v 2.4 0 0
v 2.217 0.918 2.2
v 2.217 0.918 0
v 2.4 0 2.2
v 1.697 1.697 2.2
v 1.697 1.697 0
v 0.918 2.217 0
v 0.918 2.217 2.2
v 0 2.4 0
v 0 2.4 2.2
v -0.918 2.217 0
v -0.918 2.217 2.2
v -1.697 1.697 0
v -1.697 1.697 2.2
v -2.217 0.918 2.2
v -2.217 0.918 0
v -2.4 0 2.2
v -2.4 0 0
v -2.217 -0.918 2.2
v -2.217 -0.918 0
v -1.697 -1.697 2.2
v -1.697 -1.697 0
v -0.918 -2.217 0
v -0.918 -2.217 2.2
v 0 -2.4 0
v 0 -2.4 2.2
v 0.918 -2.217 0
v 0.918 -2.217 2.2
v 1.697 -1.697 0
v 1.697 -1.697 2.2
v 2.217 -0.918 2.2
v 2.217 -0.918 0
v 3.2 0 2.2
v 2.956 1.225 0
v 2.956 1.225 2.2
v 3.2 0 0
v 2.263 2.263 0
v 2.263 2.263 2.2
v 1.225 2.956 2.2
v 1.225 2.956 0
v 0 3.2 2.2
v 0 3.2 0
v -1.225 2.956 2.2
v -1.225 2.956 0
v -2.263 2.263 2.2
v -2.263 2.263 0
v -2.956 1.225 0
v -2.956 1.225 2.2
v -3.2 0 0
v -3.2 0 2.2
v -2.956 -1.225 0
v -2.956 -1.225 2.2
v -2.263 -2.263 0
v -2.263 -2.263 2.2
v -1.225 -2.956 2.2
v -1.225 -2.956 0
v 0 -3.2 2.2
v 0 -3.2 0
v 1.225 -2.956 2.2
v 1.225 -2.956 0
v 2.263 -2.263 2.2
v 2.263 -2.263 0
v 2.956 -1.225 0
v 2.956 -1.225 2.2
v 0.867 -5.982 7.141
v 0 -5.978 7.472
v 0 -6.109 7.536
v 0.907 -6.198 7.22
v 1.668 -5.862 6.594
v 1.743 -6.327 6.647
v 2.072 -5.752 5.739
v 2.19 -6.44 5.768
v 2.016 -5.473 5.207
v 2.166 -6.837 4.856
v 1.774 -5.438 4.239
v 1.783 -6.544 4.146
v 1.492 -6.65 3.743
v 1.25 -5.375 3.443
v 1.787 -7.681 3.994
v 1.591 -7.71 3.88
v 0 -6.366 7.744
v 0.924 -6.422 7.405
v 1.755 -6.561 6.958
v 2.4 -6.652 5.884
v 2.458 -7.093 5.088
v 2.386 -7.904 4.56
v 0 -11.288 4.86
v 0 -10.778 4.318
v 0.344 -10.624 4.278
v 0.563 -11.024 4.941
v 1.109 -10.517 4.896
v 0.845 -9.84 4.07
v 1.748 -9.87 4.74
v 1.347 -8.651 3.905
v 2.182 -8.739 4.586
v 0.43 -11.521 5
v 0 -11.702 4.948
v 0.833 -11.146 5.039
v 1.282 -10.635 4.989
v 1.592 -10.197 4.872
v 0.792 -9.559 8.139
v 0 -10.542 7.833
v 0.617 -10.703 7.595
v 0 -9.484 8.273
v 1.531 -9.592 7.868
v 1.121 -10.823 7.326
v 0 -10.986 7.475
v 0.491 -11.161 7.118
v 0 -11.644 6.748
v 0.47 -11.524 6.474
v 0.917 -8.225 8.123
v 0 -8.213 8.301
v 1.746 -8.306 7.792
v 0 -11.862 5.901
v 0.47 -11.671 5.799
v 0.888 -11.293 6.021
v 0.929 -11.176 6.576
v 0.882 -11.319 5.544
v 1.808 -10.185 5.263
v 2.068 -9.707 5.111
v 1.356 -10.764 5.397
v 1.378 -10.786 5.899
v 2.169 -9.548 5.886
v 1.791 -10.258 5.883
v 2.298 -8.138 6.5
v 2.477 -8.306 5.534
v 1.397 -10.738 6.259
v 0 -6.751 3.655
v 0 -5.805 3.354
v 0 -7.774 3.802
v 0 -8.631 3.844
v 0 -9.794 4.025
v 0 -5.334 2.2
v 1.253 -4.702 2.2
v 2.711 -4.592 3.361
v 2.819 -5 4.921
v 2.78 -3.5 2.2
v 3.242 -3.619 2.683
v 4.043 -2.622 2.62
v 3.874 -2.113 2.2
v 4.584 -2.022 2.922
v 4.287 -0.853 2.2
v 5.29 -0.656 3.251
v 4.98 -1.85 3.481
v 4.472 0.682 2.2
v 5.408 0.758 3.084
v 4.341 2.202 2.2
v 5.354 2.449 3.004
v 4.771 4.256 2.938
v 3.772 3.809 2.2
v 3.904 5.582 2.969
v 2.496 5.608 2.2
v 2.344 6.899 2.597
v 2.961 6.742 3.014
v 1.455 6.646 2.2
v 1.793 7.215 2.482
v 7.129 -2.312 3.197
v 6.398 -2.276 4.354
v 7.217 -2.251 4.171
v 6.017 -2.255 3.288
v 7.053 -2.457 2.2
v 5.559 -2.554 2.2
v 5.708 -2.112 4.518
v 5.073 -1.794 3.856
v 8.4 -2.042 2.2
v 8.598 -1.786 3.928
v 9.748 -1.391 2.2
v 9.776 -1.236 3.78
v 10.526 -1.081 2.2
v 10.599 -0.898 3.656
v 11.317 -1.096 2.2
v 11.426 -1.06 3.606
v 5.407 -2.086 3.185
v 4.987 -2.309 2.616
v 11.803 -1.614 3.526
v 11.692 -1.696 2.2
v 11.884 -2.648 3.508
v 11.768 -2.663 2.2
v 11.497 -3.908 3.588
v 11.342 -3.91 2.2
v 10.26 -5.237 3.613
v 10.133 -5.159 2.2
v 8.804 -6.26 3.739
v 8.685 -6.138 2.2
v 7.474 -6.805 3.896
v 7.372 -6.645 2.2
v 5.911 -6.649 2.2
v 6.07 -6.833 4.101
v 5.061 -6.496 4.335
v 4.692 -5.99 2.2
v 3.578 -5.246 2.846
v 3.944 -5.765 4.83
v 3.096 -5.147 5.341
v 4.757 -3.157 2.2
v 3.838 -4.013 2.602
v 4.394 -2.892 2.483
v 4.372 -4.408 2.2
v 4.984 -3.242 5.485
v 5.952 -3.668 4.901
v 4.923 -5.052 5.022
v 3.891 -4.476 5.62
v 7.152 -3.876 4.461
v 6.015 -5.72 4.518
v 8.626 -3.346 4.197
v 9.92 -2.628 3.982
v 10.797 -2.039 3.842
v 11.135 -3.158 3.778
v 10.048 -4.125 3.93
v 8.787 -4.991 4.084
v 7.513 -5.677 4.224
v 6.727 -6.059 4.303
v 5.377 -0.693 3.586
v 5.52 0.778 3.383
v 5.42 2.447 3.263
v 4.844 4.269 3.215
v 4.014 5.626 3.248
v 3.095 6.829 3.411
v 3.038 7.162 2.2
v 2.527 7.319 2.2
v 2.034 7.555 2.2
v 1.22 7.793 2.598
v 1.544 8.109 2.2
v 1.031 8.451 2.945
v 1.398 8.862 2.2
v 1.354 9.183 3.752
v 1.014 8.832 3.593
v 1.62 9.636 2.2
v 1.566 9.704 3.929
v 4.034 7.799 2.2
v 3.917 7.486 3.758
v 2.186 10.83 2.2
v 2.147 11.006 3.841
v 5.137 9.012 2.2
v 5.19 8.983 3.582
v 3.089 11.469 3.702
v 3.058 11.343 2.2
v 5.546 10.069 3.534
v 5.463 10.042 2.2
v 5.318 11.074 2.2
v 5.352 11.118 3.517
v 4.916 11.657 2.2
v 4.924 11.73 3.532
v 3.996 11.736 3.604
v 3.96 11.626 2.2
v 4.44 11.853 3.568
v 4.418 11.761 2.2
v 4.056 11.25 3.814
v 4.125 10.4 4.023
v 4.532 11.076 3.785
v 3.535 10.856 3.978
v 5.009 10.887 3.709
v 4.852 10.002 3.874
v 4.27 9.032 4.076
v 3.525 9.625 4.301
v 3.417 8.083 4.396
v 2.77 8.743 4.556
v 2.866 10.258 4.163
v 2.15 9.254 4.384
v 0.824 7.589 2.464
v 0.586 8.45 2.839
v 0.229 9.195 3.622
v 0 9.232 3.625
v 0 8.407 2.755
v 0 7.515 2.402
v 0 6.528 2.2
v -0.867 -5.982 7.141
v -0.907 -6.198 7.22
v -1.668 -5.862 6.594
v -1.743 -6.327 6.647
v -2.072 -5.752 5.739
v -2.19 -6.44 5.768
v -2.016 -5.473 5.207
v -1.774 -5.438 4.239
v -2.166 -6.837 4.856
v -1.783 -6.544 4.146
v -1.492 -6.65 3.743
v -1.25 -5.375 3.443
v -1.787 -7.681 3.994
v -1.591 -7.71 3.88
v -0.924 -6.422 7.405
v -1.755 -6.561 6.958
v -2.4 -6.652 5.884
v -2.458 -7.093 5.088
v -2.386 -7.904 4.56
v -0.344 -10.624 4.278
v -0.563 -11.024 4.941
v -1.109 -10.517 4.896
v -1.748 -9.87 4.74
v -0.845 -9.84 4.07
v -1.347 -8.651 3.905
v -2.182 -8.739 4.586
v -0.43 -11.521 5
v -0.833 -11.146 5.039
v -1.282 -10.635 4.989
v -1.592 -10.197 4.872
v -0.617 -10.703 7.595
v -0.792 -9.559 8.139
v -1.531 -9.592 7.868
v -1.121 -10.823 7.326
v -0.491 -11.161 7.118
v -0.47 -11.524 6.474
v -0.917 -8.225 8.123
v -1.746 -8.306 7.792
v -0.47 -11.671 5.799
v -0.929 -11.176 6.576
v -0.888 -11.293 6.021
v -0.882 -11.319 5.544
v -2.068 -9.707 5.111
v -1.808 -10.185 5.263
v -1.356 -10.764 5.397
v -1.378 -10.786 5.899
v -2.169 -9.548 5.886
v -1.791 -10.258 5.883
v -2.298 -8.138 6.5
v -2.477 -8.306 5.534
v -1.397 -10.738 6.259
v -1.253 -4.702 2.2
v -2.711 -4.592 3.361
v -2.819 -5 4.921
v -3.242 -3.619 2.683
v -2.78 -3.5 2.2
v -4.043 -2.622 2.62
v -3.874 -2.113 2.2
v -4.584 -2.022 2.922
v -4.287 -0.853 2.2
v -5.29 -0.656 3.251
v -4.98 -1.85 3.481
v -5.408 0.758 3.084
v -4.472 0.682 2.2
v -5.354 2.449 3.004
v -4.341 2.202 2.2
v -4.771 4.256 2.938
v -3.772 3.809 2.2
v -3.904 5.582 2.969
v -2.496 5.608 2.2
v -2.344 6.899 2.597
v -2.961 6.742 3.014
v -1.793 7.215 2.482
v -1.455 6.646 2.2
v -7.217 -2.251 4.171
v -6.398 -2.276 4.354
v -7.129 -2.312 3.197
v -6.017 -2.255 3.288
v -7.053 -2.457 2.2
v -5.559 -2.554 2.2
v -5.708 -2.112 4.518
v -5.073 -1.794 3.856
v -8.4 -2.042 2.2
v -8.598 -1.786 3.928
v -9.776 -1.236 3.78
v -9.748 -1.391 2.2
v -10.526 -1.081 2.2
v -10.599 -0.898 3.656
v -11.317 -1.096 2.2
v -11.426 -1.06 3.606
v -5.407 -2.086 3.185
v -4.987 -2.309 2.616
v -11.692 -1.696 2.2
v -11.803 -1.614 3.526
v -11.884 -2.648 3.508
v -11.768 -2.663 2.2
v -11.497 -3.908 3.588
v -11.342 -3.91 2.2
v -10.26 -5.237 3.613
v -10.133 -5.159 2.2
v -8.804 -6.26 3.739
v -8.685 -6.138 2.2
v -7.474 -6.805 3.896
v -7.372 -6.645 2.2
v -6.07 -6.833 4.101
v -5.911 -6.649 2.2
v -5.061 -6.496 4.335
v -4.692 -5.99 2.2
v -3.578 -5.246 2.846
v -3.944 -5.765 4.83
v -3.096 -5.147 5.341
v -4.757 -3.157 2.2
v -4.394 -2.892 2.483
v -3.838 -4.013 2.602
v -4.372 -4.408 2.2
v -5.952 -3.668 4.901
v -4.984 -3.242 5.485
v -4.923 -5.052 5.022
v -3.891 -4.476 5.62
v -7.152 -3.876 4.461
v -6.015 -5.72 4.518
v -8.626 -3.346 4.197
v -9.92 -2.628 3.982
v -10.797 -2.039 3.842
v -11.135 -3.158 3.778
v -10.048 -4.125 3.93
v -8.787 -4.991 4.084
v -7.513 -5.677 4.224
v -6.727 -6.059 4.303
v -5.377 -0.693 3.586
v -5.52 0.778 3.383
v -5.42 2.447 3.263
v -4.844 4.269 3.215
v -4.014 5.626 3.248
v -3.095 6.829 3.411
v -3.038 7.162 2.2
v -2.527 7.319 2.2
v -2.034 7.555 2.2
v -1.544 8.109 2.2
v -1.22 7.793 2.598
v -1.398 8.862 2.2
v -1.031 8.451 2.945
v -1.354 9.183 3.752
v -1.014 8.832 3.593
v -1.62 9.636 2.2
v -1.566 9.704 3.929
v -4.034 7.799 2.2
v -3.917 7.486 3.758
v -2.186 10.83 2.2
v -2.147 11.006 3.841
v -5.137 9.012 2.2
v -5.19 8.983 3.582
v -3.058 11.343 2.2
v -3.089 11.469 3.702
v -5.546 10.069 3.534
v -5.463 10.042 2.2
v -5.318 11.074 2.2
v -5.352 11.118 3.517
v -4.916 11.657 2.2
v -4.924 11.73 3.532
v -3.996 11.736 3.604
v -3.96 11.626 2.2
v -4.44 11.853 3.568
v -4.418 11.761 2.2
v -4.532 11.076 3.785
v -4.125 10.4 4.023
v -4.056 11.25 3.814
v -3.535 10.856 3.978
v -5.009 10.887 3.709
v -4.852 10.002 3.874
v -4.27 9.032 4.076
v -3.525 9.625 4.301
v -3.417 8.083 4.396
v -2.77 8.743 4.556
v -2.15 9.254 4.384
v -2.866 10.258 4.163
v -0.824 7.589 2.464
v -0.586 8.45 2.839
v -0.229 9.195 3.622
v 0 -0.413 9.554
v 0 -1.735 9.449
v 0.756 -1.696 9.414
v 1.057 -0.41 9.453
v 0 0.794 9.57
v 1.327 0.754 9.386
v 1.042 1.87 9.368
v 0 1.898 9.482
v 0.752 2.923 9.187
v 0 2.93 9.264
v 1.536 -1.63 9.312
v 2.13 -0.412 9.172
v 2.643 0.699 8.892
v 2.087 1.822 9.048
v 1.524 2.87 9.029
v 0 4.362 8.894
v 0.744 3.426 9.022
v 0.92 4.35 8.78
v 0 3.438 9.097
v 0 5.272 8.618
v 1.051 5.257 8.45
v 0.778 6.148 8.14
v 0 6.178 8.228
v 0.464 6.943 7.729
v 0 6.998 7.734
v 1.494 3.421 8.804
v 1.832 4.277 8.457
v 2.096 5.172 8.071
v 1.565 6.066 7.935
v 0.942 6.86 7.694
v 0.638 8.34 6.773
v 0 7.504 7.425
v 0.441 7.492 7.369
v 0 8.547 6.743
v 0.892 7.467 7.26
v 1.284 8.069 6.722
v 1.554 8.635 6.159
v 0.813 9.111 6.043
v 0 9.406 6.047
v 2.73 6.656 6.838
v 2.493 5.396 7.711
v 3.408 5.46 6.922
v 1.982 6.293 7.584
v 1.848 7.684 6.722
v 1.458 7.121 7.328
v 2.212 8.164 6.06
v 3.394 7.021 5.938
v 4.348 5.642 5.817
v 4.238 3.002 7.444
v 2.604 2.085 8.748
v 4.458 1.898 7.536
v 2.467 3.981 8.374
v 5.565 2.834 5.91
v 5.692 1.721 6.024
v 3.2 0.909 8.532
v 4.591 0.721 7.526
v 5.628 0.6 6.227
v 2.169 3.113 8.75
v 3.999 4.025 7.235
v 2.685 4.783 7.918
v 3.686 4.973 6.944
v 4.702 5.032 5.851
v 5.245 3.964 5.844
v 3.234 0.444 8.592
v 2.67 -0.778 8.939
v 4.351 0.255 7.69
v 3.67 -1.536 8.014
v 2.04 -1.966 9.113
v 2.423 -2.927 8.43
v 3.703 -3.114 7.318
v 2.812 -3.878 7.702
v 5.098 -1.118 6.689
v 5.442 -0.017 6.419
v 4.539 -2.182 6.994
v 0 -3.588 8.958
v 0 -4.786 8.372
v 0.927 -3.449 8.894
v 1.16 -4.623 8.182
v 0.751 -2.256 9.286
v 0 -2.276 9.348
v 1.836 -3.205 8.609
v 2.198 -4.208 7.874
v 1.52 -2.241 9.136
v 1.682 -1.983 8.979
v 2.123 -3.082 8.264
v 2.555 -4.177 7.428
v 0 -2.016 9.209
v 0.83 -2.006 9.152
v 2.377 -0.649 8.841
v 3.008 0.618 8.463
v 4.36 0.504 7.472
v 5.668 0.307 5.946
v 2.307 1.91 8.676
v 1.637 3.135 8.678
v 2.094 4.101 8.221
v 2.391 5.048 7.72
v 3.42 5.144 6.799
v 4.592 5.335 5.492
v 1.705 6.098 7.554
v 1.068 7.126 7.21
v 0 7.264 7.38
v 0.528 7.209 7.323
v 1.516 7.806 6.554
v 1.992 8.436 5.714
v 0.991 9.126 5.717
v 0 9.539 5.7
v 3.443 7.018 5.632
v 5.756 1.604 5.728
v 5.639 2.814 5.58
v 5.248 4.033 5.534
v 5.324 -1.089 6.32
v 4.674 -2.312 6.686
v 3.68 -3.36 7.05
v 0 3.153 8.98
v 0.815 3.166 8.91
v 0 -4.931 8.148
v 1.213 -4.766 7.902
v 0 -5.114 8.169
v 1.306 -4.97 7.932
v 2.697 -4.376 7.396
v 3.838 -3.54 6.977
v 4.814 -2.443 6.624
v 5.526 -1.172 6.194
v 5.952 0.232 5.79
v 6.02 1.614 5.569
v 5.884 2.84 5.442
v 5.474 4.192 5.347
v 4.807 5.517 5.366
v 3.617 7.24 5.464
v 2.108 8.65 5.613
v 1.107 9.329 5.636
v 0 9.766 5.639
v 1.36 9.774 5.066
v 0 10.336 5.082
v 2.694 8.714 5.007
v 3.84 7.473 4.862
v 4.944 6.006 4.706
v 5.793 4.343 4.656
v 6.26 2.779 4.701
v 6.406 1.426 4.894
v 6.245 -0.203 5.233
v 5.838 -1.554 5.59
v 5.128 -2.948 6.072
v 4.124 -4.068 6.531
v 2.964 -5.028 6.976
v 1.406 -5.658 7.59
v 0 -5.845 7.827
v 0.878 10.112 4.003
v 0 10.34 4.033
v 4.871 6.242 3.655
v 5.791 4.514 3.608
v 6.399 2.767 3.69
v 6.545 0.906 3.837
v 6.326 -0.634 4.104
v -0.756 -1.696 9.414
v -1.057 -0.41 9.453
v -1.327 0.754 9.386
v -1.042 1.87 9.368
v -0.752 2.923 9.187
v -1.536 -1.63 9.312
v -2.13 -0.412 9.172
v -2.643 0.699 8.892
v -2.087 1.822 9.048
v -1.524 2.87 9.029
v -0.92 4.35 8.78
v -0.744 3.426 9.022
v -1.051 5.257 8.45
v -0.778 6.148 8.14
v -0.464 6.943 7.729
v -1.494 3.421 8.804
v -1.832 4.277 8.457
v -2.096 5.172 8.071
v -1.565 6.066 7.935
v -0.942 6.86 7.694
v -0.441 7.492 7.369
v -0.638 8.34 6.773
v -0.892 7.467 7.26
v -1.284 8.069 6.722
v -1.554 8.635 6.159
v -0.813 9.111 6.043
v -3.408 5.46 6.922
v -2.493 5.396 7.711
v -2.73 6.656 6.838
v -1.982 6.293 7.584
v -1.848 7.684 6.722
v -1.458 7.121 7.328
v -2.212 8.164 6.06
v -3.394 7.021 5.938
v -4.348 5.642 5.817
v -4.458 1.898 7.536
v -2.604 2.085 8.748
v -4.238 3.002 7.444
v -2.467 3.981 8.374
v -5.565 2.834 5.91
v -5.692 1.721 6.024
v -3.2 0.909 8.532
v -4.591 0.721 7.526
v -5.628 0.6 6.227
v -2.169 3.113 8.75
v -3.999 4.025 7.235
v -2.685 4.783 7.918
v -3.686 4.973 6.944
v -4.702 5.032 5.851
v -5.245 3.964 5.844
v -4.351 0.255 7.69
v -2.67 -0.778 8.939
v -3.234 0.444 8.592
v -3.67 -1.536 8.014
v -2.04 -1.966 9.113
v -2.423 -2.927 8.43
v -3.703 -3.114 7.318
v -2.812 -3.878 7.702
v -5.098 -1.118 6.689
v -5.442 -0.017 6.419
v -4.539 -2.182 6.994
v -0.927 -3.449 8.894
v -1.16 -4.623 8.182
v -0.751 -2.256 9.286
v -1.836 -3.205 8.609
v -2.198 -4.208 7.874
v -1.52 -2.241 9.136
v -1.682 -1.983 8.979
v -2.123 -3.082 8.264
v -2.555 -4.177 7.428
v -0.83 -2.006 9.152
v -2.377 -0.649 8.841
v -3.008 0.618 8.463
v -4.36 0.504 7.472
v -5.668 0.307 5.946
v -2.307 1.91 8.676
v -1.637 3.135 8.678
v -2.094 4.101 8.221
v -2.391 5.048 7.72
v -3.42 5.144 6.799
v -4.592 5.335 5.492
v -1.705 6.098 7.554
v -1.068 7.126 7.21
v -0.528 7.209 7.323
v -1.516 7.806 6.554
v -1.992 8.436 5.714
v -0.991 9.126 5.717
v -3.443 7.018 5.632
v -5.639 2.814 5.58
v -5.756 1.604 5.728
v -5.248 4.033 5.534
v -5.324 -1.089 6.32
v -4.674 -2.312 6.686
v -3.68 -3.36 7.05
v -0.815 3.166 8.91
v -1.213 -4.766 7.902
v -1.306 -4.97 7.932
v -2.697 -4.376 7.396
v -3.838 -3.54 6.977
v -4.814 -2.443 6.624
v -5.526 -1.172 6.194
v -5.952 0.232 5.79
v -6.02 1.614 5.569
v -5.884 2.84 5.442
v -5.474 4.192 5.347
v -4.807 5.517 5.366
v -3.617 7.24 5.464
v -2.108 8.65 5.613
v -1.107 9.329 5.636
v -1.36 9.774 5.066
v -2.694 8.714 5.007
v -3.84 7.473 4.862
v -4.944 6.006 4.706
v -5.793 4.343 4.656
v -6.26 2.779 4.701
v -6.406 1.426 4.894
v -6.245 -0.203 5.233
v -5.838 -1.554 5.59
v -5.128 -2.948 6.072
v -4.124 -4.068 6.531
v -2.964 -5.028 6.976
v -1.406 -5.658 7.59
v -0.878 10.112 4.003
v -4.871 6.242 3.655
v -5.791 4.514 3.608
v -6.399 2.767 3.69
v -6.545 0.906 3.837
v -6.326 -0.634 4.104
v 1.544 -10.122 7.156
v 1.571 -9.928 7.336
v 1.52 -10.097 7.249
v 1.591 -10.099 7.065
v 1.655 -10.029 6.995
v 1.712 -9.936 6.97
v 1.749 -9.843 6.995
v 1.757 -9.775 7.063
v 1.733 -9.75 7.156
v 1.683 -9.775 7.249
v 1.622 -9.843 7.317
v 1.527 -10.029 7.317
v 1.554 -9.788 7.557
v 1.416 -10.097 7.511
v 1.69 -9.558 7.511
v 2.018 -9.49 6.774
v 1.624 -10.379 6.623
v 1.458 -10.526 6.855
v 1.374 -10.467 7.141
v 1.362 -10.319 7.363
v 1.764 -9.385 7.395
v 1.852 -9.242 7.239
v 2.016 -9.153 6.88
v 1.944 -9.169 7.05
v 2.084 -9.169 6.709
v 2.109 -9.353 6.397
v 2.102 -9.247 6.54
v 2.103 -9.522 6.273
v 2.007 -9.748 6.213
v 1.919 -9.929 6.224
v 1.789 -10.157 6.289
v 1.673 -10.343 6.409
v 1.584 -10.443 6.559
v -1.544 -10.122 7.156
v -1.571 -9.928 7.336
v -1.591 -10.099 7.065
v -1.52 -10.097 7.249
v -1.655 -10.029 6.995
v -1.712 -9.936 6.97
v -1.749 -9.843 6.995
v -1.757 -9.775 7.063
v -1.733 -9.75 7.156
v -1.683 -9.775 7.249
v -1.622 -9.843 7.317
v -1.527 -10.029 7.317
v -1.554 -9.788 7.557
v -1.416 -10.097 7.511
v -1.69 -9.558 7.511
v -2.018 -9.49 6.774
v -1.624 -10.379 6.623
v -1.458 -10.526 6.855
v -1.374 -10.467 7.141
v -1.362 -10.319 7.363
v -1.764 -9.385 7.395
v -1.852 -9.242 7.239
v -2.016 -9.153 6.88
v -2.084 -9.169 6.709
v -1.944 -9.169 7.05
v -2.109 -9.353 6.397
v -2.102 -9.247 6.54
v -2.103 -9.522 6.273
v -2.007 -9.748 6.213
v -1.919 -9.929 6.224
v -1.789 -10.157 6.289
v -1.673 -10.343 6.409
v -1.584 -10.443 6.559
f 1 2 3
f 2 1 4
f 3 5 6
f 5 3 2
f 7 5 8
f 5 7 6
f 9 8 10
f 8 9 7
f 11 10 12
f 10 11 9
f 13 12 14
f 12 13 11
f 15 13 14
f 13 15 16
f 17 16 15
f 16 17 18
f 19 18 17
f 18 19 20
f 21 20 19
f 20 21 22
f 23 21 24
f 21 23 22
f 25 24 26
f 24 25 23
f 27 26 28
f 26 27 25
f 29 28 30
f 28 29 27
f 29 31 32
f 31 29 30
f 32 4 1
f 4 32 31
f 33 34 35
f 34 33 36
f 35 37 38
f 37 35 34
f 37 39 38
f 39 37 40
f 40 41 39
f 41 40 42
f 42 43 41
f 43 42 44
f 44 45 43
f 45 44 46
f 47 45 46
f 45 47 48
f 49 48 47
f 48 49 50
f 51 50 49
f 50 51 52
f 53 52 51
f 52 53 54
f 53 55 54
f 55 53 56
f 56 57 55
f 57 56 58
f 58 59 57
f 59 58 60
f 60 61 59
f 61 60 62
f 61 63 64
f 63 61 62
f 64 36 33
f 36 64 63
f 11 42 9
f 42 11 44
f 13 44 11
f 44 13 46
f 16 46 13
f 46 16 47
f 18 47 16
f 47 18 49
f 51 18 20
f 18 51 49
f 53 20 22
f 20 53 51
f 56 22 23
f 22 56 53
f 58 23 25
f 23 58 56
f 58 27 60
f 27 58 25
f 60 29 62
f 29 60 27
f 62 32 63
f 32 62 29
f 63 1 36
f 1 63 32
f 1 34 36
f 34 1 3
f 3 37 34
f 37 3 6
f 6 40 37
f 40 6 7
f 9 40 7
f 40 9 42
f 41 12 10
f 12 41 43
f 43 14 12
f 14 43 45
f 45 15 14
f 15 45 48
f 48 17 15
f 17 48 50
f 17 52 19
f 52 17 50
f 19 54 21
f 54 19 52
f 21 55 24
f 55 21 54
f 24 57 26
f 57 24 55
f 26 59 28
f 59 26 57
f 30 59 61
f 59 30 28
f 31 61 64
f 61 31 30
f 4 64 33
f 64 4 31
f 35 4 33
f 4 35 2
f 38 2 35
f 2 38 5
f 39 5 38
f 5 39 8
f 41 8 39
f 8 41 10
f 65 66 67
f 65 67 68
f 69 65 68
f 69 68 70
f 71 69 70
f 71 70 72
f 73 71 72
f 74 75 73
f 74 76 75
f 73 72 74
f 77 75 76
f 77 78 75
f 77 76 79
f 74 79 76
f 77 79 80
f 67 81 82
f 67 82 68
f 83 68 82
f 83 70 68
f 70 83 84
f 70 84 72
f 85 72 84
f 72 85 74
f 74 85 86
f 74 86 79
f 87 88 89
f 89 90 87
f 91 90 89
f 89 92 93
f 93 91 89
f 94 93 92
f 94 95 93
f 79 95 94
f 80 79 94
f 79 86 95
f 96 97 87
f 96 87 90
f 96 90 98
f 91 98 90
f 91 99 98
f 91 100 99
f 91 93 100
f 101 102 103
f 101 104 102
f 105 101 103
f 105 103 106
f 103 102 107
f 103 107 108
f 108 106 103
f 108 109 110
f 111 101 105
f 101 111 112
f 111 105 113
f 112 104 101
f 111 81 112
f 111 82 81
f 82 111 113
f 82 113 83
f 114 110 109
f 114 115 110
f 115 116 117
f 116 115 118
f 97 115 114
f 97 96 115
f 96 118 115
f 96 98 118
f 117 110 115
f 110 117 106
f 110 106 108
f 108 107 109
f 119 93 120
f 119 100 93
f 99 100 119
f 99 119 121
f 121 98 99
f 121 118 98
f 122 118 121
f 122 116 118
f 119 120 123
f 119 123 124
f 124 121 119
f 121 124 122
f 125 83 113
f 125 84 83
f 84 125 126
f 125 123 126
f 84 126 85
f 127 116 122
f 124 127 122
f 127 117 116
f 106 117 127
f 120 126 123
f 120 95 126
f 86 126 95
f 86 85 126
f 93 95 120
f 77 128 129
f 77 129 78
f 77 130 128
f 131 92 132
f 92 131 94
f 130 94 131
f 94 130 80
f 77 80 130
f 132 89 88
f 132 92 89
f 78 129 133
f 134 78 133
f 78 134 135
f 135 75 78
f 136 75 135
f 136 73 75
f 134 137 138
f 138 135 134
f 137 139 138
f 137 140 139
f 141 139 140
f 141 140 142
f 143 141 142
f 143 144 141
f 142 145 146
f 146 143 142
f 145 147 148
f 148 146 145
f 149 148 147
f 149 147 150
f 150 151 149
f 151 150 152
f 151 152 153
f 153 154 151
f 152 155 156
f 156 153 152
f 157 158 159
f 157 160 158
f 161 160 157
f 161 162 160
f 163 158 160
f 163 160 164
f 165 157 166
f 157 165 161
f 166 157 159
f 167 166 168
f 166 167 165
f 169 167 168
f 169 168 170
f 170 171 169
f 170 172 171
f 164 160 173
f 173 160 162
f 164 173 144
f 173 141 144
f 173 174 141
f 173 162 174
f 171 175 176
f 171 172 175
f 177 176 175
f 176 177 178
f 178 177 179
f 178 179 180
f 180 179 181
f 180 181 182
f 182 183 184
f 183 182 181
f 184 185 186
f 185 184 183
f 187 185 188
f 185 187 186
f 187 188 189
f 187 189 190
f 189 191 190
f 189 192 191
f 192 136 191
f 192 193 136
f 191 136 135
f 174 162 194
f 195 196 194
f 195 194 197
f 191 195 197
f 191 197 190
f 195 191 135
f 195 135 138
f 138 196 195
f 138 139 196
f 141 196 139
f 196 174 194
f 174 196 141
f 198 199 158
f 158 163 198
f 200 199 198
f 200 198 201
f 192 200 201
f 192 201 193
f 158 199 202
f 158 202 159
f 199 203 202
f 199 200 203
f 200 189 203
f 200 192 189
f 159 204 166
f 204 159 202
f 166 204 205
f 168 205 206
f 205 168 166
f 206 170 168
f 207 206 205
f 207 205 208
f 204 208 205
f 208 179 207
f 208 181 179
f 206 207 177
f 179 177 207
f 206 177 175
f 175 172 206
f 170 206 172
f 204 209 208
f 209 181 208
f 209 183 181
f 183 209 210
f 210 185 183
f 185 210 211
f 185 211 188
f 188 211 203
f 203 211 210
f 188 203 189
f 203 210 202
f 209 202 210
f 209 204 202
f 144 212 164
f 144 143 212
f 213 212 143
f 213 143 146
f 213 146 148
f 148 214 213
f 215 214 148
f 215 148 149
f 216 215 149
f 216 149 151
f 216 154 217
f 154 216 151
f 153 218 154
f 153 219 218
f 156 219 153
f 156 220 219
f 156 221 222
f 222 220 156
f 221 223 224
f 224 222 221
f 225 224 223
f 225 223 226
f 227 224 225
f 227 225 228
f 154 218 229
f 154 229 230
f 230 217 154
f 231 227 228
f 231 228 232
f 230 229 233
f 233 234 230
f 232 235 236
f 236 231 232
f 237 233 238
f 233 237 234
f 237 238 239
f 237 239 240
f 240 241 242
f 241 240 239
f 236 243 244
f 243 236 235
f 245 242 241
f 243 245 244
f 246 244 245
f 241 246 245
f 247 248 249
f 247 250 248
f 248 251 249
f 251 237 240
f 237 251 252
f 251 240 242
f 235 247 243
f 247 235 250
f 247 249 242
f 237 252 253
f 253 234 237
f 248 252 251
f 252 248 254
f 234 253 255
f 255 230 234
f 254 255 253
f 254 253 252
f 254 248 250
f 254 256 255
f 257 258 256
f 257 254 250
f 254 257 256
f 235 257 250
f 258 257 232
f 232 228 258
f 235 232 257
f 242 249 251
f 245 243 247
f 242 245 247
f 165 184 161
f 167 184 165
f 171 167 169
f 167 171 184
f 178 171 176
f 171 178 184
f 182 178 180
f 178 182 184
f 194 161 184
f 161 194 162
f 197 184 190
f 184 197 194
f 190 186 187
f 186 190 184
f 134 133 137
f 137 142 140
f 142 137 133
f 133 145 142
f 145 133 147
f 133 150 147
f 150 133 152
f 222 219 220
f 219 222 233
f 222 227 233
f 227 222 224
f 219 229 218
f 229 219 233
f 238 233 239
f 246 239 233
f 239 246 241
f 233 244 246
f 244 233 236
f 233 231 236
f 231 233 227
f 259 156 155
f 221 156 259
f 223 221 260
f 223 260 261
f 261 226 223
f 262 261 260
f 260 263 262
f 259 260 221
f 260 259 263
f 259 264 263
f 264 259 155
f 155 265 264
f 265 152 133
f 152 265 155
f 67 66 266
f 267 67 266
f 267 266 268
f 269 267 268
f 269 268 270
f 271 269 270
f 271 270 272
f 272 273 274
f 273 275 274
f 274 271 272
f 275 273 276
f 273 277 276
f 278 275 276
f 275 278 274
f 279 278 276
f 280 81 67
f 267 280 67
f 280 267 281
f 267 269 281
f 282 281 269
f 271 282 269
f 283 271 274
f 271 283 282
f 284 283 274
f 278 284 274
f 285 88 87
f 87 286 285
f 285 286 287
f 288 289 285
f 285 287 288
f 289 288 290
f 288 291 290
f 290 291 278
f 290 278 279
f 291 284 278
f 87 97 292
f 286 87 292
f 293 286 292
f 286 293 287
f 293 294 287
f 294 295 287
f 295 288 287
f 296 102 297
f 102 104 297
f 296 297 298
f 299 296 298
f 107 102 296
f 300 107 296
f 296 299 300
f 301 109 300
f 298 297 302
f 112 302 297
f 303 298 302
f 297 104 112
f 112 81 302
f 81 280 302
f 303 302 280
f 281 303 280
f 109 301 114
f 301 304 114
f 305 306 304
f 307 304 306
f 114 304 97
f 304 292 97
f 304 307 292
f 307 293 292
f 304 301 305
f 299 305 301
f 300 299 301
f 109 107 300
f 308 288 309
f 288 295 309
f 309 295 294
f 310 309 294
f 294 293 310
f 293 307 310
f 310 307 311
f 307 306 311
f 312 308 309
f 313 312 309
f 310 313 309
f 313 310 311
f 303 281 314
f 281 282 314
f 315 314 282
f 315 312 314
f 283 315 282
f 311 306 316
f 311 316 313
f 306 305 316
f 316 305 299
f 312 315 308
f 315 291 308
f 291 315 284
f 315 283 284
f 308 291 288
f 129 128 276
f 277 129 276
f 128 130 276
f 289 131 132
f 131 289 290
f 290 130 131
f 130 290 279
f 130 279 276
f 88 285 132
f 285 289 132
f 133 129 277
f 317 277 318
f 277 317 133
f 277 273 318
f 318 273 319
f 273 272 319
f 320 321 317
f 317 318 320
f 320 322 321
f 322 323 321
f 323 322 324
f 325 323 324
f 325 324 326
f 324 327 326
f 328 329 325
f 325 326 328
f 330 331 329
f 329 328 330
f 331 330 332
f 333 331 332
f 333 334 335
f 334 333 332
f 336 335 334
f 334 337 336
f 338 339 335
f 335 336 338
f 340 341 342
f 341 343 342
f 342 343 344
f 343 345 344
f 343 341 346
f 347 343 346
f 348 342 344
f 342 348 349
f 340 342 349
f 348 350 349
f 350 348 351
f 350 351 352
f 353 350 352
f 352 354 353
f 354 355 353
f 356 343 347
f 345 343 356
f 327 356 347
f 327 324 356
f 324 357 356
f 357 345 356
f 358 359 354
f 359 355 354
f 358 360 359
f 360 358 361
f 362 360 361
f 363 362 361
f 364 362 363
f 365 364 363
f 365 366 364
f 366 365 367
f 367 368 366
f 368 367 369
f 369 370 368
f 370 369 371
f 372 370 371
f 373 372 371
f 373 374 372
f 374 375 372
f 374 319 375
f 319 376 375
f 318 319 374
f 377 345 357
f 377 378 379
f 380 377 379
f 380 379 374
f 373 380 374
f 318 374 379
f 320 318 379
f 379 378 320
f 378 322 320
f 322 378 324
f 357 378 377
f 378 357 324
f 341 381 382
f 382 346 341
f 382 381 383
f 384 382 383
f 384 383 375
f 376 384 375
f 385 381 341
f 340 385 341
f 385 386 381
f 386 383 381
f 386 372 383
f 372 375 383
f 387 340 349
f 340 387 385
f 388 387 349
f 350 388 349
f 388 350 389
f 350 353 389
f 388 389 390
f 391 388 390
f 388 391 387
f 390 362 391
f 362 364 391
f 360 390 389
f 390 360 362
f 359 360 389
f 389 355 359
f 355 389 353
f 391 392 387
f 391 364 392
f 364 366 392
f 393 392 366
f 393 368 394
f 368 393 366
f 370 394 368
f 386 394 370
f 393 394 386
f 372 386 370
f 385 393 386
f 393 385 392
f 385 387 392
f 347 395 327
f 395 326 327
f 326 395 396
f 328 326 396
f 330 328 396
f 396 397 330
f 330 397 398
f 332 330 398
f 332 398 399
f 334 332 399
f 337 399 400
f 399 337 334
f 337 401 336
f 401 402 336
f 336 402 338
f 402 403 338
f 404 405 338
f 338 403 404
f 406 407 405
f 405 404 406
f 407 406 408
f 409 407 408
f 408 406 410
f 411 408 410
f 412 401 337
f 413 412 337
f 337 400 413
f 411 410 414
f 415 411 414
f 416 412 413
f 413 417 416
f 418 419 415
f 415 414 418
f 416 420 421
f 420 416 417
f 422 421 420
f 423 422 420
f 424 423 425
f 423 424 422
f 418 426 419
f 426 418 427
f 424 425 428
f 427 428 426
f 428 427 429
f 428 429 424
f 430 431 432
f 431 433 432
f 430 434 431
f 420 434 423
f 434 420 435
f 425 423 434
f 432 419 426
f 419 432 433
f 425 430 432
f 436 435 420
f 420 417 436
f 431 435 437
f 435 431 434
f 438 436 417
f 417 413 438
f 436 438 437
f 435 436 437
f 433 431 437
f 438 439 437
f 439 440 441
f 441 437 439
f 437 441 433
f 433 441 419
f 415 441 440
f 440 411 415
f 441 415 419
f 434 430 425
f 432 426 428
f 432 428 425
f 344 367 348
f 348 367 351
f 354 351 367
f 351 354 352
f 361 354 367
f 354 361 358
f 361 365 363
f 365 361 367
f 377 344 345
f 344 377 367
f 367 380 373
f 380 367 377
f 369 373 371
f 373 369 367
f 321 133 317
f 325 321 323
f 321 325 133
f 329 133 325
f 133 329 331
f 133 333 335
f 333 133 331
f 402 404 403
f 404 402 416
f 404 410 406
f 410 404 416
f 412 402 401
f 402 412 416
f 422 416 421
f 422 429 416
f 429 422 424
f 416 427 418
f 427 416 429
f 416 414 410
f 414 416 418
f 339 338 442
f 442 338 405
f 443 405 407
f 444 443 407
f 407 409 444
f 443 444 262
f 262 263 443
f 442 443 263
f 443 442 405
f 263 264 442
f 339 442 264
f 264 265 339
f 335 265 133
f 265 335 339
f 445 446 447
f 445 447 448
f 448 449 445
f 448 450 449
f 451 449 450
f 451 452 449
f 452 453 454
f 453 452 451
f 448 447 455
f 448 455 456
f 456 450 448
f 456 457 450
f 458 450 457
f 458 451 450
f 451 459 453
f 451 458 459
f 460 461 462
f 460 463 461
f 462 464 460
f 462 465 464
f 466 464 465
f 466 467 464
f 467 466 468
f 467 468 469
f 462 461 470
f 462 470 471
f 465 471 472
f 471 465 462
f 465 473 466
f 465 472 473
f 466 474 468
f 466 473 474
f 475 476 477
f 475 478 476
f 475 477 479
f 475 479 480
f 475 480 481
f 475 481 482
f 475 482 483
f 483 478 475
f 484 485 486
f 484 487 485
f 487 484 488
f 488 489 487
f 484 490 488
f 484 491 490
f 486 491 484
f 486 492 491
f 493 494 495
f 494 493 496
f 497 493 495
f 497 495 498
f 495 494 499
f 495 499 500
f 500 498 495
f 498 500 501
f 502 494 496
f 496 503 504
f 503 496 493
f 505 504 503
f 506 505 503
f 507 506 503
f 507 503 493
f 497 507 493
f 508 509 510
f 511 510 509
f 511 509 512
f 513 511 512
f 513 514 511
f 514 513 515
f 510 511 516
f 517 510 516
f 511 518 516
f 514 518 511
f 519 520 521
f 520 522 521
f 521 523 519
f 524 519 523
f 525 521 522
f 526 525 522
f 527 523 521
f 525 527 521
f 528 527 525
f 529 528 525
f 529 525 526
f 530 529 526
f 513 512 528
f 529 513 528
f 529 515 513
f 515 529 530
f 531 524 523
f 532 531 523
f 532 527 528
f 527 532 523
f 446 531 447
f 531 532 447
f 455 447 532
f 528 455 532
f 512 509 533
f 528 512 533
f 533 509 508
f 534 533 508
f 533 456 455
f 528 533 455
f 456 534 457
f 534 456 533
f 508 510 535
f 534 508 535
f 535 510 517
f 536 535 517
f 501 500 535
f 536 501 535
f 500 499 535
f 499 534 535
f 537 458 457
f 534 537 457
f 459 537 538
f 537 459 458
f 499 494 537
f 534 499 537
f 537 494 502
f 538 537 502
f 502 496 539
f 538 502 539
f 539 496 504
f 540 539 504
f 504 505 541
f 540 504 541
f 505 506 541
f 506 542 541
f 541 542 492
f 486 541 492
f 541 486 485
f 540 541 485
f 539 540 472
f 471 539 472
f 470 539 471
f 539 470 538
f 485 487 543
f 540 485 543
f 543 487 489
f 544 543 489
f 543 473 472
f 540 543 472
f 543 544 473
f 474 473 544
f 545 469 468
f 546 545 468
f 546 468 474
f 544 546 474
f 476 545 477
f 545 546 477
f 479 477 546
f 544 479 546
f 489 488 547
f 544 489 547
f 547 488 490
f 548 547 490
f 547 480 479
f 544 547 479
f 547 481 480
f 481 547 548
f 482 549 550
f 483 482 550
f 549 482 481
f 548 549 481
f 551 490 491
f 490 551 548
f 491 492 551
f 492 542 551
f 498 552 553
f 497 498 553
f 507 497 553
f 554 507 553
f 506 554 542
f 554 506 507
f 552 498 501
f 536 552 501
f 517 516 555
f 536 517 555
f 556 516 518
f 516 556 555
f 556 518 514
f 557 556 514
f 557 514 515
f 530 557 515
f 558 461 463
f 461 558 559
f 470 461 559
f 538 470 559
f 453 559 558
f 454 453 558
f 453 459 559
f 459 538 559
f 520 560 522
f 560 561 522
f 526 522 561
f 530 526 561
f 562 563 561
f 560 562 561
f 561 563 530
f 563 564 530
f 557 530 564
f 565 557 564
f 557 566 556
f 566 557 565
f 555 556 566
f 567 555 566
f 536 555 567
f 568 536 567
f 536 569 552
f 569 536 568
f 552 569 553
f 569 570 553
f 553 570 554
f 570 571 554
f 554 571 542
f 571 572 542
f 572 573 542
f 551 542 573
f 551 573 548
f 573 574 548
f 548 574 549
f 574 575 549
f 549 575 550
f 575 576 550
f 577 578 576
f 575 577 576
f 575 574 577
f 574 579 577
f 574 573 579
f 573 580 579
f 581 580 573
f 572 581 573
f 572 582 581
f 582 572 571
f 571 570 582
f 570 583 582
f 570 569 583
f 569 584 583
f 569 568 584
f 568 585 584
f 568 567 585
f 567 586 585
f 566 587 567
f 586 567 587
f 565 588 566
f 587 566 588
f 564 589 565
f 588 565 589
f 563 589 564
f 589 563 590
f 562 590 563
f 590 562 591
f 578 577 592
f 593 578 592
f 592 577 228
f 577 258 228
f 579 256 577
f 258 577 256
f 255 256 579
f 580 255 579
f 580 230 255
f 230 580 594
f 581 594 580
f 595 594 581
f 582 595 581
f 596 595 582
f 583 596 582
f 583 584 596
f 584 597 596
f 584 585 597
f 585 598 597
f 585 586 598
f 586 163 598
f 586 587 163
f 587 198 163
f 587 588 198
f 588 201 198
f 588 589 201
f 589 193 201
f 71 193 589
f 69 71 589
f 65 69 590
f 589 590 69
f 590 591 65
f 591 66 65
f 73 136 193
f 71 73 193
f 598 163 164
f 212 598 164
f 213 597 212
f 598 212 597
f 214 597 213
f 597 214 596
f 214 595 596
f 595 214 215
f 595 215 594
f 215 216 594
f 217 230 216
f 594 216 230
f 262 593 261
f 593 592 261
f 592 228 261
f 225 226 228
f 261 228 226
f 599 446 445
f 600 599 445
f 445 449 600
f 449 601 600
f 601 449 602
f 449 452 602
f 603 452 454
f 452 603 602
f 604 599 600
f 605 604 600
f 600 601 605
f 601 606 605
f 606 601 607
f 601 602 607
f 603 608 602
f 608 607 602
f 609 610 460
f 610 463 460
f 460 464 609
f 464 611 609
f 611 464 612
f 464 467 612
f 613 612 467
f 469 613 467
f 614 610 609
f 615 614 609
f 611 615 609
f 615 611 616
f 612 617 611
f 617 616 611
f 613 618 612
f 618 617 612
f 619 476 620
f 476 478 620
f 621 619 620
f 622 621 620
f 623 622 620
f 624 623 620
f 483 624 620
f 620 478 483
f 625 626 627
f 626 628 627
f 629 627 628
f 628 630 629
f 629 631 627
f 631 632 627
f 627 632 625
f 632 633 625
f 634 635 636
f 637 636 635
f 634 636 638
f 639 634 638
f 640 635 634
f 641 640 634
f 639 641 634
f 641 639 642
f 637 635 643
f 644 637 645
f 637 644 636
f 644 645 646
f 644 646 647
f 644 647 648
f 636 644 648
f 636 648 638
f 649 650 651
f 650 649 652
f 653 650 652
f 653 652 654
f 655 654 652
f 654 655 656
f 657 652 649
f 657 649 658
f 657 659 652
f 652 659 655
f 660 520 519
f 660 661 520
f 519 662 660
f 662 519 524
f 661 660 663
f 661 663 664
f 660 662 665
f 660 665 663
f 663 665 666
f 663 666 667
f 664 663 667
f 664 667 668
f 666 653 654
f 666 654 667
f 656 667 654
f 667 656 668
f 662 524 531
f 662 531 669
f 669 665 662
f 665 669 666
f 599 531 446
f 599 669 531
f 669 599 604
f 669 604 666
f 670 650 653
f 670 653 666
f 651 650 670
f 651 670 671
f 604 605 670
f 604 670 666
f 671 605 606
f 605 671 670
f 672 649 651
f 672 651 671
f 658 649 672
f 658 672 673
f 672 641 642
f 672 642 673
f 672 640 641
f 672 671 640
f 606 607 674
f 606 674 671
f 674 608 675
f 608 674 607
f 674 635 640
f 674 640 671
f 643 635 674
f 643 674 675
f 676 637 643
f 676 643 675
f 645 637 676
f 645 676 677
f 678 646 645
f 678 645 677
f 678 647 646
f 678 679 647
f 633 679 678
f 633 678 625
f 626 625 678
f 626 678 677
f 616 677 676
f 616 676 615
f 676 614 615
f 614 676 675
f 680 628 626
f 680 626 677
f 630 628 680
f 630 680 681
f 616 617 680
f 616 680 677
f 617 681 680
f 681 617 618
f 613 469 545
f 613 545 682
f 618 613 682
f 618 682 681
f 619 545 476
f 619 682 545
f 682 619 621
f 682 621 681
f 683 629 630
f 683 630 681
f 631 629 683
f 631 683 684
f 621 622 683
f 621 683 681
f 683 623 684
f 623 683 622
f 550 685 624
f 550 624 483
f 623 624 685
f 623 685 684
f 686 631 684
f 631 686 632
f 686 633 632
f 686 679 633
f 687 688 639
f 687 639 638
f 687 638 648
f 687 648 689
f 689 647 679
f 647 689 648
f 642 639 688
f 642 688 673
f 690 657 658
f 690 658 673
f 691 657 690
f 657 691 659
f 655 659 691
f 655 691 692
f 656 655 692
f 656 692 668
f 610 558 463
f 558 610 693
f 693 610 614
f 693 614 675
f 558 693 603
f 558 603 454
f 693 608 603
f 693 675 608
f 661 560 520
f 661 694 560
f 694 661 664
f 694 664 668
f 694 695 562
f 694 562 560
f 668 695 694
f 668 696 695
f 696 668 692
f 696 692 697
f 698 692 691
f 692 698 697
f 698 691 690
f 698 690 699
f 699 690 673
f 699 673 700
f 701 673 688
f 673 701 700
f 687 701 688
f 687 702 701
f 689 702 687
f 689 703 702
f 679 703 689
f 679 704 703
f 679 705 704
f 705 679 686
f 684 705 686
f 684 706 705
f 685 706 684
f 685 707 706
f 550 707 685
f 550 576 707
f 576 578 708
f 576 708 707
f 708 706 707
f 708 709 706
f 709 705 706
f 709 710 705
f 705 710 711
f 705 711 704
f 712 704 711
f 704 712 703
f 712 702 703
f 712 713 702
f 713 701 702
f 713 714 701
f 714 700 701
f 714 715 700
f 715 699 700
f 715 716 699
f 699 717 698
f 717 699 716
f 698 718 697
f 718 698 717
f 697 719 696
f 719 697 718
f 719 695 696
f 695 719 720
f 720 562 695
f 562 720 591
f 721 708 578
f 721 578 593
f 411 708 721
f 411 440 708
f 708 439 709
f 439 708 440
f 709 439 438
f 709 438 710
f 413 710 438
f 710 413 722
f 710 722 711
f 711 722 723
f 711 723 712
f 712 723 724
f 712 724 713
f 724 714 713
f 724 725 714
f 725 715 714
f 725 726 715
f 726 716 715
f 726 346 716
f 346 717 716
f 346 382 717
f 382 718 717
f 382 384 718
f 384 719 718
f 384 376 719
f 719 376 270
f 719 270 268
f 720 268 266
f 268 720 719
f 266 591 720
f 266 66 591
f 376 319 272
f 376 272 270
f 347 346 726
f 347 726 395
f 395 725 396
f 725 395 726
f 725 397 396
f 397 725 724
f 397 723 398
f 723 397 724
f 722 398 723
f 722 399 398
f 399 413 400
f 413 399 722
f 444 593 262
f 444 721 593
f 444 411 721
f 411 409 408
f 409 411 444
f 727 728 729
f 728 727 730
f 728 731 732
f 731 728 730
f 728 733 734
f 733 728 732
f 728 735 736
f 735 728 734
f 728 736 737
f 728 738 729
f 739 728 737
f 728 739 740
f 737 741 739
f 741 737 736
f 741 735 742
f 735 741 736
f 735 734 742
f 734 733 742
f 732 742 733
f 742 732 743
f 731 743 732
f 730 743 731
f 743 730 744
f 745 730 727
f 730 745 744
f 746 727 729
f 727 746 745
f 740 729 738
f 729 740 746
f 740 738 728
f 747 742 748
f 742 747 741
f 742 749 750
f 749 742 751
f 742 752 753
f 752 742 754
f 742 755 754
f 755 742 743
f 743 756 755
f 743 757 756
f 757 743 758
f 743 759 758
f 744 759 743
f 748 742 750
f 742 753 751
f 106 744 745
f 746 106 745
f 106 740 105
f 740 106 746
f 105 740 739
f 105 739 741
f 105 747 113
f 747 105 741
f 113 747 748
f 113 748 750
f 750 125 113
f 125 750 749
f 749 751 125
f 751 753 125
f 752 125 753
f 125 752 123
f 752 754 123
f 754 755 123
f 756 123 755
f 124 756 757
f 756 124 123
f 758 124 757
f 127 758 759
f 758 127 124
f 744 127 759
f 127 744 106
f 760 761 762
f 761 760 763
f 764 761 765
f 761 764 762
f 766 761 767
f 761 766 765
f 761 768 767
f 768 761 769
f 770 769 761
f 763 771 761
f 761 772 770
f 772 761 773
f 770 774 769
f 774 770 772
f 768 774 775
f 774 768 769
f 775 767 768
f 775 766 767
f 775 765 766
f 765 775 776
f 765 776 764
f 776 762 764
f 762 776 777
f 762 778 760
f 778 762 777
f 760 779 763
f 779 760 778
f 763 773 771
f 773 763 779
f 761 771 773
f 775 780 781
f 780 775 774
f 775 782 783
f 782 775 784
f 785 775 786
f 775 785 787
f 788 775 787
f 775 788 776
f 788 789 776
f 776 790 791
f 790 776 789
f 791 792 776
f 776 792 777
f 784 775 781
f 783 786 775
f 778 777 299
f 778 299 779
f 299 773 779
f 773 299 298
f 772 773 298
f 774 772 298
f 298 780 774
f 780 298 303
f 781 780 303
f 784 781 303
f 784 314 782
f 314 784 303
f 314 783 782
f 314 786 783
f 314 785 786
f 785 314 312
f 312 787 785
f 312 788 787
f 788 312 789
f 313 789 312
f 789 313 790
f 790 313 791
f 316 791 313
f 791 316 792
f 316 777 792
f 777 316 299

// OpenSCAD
use <../lib.scad>
use <s/67040p01s01.scad>
use <s/67040s01.scad>
use <s/67040s02.scad>
use <../p/stud4.scad>
function ldraw_lib__67040p02() = [
// 0 Animal Sea Turtle Baby with Black Eyes and Dark Red Shell Pattern
// 0 Name: 67040p02.dat
// 0 Author: Vincent Messenet [Cheenzo]
// 0 !LDRAW_ORG Part UPDATE 2025-01
// 0 !LICENSE Licensed under CC BY 4.0 : see CAreadme.txt
// 
// 0 BFC CERTIFY CCW
  [0,"BFC","CERTIFY"],
  [0,"BFC","CCW"],
// 
// 0 !KEYWORDS Bricklink 67040pb02, Set 60328
// 
// 0 !HISTORY 2025-01-20 [OrionP] Official Update 2025-01
// 
// 1 16 0 -5.5 0 1 0 0 0 -1.375 0 0 0 1 stud4.dat
  [1,16,0,-5.5,0,1,0,0,0,-1.375,0,0,0,1, ldraw_lib__stud4()],
// 1 16 0 0 0 1 0 0 0 1 0 0 0 1 s\67040s01.dat
  [1,16,0,0,0,1,0,0,0,1,0,0,0,1, ldraw_lib__s__67040s01()],
// 1 16 0 0 0 -1 0 0 0 1 0 0 0 1 s\67040s01.dat
  [1,16,0,0,0,-1,0,0,0,1,0,0,0,1, ldraw_lib__s__67040s01()],
// 
// 1 320 0 0 0 1 0 0 0 1 0 0 0 1 s\67040s02.dat
  [1,320,0,0,0,1,0,0,0,1,0,0,0,1, ldraw_lib__s__67040s02()],
// 1 320 0 0 0 -1 0 0 0 1 0 0 0 1 s\67040s02.dat
  [1,320,0,0,0,-1,0,0,0,1,0,0,0,1, ldraw_lib__s__67040s02()],
// 
// 1 16 0 0 0 1 0 0 0 1 0 0 0 1 s\67040p01s01.dat
  [1,16,0,0,0,1,0,0,0,1,0,0,0,1, ldraw_lib__s__67040p01s01()],
// 1 16 0 0 0 -1 0 0 0 1 0 0 0 1 s\67040p01s01.dat
  [1,16,0,0,0,-1,0,0,0,1,0,0,0,1, ldraw_lib__s__67040p01s01()],
];
module ldraw_lib__67040p02(step=0, col=false, unit=2/5, alt=false, line=0.2, solid=!$preview)
    makepoly(ldraw_lib__67040p02(), step=step, col=col, unit=unit, alt=alt, line=line, solid=solid);
ldraw_lib__67040p02(line=0.2);
